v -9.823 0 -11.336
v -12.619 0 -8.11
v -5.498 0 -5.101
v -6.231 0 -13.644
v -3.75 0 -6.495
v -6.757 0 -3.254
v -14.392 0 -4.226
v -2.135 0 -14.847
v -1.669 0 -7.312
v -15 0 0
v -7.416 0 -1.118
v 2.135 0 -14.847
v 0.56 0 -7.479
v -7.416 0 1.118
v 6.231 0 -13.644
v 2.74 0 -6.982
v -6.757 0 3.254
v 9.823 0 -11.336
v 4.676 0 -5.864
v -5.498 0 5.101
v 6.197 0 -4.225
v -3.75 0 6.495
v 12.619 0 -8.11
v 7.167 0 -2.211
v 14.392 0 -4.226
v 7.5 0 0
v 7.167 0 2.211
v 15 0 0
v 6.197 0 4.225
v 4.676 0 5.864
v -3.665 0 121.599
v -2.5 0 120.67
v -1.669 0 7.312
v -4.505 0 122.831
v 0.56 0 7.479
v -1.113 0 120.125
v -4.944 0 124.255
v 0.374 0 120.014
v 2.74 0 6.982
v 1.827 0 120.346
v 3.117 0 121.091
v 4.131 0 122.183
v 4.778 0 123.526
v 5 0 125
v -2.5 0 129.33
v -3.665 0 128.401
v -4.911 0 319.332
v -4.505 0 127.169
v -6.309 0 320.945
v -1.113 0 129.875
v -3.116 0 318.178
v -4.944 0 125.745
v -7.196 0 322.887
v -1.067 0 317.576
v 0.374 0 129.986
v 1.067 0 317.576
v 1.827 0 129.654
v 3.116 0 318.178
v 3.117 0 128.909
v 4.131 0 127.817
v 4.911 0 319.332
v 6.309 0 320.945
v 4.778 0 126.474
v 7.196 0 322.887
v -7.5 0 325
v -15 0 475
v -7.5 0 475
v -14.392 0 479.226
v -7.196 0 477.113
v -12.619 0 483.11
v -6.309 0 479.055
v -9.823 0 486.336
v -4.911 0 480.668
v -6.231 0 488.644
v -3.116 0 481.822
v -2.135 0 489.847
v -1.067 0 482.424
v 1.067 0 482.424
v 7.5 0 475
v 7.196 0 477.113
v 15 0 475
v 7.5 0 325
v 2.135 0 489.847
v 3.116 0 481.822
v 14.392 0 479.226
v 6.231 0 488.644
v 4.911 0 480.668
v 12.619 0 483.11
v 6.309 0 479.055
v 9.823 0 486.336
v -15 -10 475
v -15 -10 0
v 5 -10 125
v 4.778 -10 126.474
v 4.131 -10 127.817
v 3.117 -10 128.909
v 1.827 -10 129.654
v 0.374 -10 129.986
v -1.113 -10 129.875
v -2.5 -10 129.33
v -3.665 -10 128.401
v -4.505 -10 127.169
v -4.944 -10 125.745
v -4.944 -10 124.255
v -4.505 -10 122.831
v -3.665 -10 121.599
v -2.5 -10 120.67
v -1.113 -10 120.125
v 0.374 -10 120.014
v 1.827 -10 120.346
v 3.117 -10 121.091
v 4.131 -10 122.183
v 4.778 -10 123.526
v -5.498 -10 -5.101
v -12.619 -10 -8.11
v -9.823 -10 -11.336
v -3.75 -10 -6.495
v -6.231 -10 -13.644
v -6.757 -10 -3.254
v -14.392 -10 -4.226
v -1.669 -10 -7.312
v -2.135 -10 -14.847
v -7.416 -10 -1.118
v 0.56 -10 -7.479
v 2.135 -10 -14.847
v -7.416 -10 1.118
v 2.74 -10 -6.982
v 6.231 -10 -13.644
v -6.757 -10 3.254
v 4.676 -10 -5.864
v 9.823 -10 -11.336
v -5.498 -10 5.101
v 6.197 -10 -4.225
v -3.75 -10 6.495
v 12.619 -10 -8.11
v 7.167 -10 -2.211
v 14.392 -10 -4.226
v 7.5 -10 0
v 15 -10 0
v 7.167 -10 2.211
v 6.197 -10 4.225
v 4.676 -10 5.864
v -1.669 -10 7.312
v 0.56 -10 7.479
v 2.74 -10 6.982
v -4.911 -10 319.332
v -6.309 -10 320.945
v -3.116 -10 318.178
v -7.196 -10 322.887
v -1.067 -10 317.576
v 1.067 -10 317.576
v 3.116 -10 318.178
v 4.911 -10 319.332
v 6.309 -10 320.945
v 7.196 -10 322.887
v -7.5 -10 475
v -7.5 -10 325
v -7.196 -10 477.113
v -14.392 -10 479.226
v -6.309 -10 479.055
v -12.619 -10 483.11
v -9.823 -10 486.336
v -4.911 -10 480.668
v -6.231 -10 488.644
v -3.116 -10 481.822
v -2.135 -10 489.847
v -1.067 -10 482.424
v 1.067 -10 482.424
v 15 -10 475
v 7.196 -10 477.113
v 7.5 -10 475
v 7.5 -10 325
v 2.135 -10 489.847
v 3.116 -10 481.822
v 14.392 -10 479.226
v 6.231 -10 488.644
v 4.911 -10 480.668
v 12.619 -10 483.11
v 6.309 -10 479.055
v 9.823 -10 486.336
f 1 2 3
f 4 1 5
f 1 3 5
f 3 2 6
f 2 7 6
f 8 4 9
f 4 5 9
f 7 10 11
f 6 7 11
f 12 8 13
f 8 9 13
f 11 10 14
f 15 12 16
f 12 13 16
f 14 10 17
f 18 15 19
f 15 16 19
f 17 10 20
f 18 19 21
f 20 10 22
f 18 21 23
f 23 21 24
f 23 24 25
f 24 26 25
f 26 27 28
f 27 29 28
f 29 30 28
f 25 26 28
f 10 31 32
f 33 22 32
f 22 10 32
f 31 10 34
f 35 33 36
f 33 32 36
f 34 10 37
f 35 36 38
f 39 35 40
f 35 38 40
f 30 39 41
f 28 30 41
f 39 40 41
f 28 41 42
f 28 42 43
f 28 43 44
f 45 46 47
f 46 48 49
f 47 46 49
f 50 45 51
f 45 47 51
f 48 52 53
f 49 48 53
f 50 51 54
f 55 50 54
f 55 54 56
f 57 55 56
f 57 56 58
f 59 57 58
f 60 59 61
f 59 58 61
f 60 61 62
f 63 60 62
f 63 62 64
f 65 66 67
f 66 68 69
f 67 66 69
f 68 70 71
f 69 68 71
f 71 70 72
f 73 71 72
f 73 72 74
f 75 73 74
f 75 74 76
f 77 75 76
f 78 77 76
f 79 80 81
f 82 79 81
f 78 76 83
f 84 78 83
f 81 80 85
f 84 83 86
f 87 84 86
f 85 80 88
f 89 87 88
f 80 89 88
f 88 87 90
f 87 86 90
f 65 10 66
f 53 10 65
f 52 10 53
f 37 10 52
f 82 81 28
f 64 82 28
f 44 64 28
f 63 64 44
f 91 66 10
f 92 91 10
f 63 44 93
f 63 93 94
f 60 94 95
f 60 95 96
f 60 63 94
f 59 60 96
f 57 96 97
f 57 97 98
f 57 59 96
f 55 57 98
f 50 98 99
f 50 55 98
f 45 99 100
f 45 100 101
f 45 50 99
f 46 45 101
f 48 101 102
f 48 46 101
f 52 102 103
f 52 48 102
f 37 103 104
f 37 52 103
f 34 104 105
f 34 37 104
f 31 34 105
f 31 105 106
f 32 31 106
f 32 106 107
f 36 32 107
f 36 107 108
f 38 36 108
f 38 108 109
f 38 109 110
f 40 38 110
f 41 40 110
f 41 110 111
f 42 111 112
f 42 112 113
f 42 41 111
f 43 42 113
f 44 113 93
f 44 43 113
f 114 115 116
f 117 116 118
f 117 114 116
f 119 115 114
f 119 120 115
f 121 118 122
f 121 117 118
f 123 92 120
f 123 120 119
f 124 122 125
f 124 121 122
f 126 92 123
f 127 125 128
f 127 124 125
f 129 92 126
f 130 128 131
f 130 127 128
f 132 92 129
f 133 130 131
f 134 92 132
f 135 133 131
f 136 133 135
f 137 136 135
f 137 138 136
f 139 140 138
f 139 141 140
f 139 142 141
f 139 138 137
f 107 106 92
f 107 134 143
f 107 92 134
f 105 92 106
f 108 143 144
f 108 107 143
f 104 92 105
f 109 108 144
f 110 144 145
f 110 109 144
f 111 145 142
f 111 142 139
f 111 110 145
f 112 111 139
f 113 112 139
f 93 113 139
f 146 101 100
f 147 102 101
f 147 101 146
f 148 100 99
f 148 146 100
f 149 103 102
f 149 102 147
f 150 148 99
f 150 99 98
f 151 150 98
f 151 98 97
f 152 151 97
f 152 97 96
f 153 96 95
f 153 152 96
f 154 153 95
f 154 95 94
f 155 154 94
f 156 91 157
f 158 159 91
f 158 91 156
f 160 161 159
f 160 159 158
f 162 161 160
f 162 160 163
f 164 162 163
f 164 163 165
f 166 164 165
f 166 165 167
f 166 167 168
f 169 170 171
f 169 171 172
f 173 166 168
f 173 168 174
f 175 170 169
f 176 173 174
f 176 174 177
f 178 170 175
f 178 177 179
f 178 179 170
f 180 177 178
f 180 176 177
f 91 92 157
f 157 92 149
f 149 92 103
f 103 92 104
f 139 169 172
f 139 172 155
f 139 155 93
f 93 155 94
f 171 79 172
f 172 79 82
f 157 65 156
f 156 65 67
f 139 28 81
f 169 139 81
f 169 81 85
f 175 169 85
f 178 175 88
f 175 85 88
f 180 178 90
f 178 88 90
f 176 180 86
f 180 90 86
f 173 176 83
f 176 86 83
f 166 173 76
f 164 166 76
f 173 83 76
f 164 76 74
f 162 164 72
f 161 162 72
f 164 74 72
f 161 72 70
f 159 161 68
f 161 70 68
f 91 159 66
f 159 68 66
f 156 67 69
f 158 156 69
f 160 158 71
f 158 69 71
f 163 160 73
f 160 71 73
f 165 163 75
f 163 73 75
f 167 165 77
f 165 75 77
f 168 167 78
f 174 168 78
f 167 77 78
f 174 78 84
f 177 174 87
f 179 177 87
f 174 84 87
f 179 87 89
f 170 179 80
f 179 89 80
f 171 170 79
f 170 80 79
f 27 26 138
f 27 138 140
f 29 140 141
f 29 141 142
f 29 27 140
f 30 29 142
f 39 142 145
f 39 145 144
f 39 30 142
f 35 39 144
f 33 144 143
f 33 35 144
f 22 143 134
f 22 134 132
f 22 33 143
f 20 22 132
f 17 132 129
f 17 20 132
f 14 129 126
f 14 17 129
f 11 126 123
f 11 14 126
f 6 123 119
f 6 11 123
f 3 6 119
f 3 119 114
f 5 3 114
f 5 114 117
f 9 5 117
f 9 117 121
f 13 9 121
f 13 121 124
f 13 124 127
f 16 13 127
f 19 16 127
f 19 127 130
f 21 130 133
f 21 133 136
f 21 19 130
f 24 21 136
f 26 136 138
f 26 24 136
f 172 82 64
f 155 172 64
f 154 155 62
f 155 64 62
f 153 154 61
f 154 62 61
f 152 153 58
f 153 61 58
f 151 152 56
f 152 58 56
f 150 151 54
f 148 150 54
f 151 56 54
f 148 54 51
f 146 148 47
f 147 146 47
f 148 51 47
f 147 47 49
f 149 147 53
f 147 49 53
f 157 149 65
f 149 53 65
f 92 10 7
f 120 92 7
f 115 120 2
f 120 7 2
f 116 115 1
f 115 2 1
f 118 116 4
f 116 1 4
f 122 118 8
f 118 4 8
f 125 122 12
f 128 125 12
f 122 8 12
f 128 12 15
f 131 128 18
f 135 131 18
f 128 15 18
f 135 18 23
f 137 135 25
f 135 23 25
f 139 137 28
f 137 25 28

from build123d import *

# Parameters (mm, degrees)
F0_R     = 7.5
F0_R_2   = 5
F1_DEPTH = 10


with BuildPart() as f1:
    # F0 (on Front) → F1 (new body)
    with BuildSketch(Plane.XZ):
        with BuildLine():
            Line((-15, 475), (-15, 0))
            ThreePointArc((-15, 0), (0, -15), (15, 0))
            Line((15, 0), (15, 475))
            ThreePointArc((15, 475), (0, 490), (-15, 475))
        make_face()
        Circle(F0_R, mode=Mode.SUBTRACT)
        with Locations((0, 125)):
            Circle(F0_R_2, mode=Mode.SUBTRACT)
        with BuildLine():
            ThreePointArc((-7.5, 475), (0, 482.5), (7.5, 475))
            Line((7.5, 475), (7.5, 325))
            ThreePointArc((7.5, 325), (0, 317.5), (-7.5, 325))
            Line((-7.5, 325), (-7.5, 475))
        make_face(mode=Mode.SUBTRACT)
    extrude(amount=F1_DEPTH)


solid = f1.part
